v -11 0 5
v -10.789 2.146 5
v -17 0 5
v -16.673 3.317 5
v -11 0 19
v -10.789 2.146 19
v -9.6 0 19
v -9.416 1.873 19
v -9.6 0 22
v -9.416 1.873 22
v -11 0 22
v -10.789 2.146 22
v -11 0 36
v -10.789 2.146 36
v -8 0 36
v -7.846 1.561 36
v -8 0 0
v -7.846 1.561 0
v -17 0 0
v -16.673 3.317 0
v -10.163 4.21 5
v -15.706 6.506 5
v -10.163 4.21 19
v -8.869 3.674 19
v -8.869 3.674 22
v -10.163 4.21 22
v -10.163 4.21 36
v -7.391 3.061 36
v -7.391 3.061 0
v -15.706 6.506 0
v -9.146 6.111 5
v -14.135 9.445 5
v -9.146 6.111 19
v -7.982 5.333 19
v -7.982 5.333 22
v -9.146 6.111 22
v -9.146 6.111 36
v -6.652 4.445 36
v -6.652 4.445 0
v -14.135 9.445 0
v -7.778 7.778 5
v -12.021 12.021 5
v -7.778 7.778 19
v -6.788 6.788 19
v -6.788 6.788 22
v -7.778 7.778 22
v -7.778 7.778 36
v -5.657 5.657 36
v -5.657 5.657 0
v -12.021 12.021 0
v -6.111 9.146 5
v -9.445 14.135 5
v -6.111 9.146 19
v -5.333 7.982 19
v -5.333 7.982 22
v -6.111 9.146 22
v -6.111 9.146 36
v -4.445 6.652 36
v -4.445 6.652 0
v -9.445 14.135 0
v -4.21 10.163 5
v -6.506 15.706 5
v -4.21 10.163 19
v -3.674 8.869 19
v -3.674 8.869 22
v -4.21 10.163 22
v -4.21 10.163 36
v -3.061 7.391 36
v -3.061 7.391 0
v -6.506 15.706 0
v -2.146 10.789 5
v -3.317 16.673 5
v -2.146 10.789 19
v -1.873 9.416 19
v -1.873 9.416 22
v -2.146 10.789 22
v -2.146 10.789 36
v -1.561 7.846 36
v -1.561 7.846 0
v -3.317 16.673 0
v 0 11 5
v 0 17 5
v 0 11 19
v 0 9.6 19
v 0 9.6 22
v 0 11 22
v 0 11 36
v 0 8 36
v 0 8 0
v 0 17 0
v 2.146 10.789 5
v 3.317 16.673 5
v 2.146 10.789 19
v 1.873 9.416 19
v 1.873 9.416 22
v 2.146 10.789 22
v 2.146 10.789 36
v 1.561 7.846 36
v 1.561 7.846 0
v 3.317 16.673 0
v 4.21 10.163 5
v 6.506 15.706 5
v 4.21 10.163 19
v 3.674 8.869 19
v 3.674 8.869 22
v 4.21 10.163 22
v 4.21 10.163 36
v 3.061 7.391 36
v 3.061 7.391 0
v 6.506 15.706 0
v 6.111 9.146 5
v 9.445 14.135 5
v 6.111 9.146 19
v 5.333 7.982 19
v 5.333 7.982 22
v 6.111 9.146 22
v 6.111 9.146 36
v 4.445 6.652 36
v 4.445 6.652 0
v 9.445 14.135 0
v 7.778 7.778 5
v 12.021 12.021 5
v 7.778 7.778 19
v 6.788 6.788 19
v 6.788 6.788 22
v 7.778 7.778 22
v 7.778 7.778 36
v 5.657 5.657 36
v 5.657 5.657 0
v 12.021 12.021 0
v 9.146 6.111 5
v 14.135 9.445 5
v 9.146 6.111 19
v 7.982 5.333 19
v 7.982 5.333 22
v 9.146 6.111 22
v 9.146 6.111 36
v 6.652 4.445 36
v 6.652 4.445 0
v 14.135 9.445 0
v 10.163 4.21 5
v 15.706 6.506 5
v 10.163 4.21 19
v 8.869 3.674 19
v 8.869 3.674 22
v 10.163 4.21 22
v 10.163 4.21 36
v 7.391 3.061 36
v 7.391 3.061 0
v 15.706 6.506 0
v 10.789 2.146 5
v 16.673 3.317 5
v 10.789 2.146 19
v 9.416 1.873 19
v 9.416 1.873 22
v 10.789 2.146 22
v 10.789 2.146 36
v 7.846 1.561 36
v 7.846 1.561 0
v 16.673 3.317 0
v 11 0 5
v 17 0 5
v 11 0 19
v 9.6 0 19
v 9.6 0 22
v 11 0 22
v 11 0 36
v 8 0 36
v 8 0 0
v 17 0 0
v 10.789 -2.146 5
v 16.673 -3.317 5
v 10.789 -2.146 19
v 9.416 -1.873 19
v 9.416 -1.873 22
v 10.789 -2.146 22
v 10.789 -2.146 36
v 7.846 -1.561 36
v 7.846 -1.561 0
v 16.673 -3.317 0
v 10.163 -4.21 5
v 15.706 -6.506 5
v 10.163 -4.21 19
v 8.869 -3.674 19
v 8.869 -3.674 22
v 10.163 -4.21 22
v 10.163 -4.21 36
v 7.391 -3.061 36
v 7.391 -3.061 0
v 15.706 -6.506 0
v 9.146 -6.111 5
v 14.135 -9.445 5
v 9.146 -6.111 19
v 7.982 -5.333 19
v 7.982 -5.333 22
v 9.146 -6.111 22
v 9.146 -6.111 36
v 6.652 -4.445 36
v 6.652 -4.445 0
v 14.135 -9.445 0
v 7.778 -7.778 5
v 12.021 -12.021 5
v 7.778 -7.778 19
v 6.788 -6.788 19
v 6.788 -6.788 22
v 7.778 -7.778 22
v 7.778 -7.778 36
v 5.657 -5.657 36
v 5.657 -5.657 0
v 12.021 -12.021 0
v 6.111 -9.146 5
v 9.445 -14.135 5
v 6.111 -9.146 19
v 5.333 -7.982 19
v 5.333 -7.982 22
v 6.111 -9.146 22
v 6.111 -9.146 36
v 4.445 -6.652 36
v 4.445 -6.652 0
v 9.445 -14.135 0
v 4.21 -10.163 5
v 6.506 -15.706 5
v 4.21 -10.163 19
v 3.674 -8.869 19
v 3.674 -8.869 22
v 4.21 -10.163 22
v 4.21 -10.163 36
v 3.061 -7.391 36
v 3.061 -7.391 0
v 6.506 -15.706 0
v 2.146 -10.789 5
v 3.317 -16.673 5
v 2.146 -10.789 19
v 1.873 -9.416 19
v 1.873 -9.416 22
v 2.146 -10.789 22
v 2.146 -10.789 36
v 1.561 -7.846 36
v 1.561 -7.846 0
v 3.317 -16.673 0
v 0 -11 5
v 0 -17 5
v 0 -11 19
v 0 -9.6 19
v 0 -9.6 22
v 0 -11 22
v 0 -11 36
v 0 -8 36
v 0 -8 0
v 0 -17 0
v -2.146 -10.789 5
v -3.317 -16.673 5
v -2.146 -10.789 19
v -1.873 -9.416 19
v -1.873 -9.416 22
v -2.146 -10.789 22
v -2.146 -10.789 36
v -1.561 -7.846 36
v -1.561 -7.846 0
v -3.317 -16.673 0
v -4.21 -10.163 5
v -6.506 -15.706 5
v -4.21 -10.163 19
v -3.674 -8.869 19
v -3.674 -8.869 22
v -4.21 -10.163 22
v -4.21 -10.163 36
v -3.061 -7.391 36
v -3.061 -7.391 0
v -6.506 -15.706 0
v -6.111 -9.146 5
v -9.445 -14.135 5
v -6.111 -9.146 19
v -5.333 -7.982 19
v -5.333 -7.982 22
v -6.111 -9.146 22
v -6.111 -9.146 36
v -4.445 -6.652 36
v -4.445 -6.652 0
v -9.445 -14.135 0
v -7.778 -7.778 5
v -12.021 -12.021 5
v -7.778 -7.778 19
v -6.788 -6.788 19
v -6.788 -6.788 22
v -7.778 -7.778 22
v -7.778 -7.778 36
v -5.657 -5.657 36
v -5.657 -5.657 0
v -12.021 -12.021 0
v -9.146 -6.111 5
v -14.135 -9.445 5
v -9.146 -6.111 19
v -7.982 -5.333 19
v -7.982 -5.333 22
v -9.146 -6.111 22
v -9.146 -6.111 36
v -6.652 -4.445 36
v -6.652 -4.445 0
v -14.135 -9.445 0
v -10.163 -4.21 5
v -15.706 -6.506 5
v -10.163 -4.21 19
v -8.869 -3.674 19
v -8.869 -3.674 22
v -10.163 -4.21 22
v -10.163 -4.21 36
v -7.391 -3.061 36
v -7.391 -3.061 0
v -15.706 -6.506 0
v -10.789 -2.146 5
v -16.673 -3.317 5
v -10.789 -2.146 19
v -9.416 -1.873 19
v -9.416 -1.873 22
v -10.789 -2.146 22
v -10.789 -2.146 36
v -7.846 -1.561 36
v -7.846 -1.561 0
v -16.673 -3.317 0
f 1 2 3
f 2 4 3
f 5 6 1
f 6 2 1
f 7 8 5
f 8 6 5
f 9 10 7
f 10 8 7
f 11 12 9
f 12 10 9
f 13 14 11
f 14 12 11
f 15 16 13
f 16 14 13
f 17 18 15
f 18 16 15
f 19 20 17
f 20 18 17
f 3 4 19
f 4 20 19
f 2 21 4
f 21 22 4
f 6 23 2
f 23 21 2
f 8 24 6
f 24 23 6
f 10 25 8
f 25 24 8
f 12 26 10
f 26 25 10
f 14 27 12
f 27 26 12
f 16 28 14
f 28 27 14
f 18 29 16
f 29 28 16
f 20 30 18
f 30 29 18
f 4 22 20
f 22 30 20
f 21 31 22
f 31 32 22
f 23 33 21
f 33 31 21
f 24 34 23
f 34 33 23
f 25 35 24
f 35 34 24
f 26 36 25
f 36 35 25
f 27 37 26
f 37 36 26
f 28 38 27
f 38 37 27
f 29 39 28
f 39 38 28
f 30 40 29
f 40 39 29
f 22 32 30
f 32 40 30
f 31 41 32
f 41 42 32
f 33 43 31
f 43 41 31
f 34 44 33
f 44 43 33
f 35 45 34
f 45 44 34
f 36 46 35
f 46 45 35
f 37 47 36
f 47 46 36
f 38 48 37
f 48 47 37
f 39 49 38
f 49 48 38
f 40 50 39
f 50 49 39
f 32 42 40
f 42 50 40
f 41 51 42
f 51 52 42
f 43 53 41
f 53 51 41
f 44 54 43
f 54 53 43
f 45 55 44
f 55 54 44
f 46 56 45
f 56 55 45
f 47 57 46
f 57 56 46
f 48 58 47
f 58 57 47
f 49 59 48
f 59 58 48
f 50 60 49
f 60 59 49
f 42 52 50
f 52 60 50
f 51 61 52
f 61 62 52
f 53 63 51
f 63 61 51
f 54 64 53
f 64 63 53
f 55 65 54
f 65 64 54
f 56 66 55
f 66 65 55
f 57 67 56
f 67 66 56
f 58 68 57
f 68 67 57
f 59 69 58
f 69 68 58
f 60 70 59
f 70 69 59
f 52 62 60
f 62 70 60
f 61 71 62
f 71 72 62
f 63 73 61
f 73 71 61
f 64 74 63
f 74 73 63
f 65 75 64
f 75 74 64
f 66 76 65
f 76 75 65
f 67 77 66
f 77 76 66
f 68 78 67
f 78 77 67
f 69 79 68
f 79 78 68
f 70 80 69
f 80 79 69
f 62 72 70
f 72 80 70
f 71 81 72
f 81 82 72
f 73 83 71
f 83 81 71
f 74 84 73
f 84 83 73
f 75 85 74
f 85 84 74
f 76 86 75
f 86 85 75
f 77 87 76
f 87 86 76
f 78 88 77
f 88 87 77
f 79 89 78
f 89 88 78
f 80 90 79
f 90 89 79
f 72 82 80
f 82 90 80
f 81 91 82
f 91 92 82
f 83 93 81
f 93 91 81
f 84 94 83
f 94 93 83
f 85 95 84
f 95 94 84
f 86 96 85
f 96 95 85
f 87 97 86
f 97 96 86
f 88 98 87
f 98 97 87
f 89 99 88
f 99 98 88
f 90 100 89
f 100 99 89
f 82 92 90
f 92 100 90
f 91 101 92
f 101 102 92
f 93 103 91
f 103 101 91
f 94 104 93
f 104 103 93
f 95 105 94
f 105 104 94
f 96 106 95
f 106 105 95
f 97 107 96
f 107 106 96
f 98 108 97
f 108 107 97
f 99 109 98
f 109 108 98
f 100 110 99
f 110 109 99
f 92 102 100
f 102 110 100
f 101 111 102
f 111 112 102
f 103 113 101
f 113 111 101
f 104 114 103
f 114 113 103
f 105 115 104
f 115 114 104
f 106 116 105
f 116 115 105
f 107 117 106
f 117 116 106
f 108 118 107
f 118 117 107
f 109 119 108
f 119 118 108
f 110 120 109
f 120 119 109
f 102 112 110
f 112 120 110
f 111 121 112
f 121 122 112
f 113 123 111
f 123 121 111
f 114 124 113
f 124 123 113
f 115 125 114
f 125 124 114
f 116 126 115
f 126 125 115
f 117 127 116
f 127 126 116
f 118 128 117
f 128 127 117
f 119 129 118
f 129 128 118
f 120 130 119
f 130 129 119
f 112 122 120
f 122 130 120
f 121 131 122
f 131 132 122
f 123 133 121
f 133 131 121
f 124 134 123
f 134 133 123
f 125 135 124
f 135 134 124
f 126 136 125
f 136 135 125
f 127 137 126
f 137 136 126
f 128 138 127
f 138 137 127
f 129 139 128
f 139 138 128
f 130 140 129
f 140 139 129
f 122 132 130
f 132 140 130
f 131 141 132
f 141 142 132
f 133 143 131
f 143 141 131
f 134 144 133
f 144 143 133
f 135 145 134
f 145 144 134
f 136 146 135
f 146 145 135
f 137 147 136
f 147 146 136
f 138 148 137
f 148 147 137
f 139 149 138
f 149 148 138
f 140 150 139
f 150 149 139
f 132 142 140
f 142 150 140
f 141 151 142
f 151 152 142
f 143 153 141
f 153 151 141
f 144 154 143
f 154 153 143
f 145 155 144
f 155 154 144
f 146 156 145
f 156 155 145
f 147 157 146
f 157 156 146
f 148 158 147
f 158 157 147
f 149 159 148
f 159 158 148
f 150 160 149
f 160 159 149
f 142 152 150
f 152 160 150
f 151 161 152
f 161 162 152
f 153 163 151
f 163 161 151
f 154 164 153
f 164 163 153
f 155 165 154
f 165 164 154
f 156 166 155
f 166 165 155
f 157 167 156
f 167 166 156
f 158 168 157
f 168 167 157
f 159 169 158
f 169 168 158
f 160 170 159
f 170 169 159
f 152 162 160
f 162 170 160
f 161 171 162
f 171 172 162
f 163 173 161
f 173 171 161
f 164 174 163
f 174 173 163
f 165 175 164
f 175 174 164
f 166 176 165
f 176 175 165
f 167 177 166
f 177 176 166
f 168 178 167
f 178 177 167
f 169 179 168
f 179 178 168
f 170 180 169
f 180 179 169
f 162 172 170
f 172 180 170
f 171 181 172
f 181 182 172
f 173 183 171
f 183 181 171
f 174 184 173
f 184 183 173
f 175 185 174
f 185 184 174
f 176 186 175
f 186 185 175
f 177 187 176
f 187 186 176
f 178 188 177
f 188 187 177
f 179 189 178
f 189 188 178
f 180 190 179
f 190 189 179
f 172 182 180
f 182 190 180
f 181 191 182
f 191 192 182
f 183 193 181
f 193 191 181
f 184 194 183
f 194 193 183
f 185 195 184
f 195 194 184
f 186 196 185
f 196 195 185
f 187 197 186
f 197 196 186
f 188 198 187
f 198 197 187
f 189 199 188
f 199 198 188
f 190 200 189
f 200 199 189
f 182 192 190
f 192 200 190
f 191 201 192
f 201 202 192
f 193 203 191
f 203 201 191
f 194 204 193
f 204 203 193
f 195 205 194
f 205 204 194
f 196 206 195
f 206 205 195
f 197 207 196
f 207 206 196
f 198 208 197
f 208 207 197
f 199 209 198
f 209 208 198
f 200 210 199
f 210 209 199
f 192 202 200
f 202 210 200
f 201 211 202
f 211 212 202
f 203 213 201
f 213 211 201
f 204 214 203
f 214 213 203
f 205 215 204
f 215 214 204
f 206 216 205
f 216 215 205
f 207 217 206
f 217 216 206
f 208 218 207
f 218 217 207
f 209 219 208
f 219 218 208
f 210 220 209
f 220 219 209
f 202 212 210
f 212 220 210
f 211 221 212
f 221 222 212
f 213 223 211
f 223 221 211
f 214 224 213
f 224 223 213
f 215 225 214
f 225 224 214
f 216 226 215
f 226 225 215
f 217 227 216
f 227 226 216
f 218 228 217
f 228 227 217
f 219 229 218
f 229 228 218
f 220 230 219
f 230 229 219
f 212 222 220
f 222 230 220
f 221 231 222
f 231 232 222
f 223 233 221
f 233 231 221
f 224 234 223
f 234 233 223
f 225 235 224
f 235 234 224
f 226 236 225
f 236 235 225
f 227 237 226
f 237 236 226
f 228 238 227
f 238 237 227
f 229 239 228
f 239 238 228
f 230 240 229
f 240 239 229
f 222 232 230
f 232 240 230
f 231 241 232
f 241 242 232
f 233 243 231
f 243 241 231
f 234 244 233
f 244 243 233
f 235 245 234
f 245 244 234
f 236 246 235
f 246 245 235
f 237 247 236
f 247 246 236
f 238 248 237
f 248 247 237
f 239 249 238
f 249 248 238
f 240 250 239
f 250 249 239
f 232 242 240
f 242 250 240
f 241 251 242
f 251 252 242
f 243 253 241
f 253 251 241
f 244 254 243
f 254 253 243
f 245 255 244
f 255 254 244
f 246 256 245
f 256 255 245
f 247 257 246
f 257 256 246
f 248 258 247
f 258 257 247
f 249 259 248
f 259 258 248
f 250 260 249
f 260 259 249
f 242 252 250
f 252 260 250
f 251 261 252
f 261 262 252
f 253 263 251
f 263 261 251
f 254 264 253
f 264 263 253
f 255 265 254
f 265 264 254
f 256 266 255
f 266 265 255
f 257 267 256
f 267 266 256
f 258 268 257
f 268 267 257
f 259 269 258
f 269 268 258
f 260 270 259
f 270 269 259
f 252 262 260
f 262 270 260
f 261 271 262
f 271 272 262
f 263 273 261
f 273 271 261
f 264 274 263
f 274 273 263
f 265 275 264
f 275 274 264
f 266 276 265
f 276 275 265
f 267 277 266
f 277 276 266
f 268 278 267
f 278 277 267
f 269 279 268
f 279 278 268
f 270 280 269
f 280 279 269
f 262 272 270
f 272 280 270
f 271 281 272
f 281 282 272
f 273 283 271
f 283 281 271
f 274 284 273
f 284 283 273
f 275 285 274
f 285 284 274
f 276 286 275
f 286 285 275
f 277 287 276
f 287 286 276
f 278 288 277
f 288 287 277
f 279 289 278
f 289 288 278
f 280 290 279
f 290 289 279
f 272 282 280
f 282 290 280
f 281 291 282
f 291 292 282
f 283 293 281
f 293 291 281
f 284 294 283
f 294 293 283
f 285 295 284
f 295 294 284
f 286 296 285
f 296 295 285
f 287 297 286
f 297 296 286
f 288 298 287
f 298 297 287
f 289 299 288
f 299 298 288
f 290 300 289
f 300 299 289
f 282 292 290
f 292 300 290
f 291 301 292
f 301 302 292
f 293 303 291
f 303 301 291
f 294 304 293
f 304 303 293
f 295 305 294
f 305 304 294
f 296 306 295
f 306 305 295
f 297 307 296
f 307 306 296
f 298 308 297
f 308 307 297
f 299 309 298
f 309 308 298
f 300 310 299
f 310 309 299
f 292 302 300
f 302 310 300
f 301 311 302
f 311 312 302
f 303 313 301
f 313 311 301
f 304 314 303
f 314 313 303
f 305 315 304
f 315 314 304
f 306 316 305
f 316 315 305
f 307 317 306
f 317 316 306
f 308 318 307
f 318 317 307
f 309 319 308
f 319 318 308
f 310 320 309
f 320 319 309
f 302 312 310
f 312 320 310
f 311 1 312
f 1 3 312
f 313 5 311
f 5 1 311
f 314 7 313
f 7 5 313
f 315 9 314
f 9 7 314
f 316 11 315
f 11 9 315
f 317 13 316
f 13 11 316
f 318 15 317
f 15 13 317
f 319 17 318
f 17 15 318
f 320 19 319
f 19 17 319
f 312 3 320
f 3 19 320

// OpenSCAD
$fn = 32;

// ----------------------------------------------------------------------
// Grooved revolve: flanged, bore R8
// ----------------------------------------------------------------------

// --- parameters (mm) ---
bore_r = 8;               // bore radius
outer_r = 11;             // outer radius of the body
total_h = 36;             // overall height, Z
wall = 3;                 // radial wall thickness
groove_w = 3;             // groove width
groove_d = 1.4;           // groove depth
grooves = 1;              // number of outer grooves
flange_r = 17;            // flange radius
flange_h = 5;             // flange height
fit_tol = 0.05;           // declared fit tolerance (prompt contract)
free_tol = 0.3;           // declared free tolerance (prompt contract)

bbox_x = 2 * flange_r;  // full diameter
bore_d = 2 * bore_r;  // bore diameter
body_d = 2 * outer_r;  // body diameter
flange_d = 2 * flange_r;  // flange diameter
revolve_angle = 360;  // full turn around the Z axis

profile = [[8, 0], [11, 0], [17, 0], [17, 5], [11, 5], [11, 19], [9.6, 19], [9.6, 22], [11, 22], [11, 36], [8, 36]];  // primary outline, 11 points, counter clockwise

// --- the one profile operation ---
rotate_extrude(angle = revolve_angle) polygon(points = profile);
